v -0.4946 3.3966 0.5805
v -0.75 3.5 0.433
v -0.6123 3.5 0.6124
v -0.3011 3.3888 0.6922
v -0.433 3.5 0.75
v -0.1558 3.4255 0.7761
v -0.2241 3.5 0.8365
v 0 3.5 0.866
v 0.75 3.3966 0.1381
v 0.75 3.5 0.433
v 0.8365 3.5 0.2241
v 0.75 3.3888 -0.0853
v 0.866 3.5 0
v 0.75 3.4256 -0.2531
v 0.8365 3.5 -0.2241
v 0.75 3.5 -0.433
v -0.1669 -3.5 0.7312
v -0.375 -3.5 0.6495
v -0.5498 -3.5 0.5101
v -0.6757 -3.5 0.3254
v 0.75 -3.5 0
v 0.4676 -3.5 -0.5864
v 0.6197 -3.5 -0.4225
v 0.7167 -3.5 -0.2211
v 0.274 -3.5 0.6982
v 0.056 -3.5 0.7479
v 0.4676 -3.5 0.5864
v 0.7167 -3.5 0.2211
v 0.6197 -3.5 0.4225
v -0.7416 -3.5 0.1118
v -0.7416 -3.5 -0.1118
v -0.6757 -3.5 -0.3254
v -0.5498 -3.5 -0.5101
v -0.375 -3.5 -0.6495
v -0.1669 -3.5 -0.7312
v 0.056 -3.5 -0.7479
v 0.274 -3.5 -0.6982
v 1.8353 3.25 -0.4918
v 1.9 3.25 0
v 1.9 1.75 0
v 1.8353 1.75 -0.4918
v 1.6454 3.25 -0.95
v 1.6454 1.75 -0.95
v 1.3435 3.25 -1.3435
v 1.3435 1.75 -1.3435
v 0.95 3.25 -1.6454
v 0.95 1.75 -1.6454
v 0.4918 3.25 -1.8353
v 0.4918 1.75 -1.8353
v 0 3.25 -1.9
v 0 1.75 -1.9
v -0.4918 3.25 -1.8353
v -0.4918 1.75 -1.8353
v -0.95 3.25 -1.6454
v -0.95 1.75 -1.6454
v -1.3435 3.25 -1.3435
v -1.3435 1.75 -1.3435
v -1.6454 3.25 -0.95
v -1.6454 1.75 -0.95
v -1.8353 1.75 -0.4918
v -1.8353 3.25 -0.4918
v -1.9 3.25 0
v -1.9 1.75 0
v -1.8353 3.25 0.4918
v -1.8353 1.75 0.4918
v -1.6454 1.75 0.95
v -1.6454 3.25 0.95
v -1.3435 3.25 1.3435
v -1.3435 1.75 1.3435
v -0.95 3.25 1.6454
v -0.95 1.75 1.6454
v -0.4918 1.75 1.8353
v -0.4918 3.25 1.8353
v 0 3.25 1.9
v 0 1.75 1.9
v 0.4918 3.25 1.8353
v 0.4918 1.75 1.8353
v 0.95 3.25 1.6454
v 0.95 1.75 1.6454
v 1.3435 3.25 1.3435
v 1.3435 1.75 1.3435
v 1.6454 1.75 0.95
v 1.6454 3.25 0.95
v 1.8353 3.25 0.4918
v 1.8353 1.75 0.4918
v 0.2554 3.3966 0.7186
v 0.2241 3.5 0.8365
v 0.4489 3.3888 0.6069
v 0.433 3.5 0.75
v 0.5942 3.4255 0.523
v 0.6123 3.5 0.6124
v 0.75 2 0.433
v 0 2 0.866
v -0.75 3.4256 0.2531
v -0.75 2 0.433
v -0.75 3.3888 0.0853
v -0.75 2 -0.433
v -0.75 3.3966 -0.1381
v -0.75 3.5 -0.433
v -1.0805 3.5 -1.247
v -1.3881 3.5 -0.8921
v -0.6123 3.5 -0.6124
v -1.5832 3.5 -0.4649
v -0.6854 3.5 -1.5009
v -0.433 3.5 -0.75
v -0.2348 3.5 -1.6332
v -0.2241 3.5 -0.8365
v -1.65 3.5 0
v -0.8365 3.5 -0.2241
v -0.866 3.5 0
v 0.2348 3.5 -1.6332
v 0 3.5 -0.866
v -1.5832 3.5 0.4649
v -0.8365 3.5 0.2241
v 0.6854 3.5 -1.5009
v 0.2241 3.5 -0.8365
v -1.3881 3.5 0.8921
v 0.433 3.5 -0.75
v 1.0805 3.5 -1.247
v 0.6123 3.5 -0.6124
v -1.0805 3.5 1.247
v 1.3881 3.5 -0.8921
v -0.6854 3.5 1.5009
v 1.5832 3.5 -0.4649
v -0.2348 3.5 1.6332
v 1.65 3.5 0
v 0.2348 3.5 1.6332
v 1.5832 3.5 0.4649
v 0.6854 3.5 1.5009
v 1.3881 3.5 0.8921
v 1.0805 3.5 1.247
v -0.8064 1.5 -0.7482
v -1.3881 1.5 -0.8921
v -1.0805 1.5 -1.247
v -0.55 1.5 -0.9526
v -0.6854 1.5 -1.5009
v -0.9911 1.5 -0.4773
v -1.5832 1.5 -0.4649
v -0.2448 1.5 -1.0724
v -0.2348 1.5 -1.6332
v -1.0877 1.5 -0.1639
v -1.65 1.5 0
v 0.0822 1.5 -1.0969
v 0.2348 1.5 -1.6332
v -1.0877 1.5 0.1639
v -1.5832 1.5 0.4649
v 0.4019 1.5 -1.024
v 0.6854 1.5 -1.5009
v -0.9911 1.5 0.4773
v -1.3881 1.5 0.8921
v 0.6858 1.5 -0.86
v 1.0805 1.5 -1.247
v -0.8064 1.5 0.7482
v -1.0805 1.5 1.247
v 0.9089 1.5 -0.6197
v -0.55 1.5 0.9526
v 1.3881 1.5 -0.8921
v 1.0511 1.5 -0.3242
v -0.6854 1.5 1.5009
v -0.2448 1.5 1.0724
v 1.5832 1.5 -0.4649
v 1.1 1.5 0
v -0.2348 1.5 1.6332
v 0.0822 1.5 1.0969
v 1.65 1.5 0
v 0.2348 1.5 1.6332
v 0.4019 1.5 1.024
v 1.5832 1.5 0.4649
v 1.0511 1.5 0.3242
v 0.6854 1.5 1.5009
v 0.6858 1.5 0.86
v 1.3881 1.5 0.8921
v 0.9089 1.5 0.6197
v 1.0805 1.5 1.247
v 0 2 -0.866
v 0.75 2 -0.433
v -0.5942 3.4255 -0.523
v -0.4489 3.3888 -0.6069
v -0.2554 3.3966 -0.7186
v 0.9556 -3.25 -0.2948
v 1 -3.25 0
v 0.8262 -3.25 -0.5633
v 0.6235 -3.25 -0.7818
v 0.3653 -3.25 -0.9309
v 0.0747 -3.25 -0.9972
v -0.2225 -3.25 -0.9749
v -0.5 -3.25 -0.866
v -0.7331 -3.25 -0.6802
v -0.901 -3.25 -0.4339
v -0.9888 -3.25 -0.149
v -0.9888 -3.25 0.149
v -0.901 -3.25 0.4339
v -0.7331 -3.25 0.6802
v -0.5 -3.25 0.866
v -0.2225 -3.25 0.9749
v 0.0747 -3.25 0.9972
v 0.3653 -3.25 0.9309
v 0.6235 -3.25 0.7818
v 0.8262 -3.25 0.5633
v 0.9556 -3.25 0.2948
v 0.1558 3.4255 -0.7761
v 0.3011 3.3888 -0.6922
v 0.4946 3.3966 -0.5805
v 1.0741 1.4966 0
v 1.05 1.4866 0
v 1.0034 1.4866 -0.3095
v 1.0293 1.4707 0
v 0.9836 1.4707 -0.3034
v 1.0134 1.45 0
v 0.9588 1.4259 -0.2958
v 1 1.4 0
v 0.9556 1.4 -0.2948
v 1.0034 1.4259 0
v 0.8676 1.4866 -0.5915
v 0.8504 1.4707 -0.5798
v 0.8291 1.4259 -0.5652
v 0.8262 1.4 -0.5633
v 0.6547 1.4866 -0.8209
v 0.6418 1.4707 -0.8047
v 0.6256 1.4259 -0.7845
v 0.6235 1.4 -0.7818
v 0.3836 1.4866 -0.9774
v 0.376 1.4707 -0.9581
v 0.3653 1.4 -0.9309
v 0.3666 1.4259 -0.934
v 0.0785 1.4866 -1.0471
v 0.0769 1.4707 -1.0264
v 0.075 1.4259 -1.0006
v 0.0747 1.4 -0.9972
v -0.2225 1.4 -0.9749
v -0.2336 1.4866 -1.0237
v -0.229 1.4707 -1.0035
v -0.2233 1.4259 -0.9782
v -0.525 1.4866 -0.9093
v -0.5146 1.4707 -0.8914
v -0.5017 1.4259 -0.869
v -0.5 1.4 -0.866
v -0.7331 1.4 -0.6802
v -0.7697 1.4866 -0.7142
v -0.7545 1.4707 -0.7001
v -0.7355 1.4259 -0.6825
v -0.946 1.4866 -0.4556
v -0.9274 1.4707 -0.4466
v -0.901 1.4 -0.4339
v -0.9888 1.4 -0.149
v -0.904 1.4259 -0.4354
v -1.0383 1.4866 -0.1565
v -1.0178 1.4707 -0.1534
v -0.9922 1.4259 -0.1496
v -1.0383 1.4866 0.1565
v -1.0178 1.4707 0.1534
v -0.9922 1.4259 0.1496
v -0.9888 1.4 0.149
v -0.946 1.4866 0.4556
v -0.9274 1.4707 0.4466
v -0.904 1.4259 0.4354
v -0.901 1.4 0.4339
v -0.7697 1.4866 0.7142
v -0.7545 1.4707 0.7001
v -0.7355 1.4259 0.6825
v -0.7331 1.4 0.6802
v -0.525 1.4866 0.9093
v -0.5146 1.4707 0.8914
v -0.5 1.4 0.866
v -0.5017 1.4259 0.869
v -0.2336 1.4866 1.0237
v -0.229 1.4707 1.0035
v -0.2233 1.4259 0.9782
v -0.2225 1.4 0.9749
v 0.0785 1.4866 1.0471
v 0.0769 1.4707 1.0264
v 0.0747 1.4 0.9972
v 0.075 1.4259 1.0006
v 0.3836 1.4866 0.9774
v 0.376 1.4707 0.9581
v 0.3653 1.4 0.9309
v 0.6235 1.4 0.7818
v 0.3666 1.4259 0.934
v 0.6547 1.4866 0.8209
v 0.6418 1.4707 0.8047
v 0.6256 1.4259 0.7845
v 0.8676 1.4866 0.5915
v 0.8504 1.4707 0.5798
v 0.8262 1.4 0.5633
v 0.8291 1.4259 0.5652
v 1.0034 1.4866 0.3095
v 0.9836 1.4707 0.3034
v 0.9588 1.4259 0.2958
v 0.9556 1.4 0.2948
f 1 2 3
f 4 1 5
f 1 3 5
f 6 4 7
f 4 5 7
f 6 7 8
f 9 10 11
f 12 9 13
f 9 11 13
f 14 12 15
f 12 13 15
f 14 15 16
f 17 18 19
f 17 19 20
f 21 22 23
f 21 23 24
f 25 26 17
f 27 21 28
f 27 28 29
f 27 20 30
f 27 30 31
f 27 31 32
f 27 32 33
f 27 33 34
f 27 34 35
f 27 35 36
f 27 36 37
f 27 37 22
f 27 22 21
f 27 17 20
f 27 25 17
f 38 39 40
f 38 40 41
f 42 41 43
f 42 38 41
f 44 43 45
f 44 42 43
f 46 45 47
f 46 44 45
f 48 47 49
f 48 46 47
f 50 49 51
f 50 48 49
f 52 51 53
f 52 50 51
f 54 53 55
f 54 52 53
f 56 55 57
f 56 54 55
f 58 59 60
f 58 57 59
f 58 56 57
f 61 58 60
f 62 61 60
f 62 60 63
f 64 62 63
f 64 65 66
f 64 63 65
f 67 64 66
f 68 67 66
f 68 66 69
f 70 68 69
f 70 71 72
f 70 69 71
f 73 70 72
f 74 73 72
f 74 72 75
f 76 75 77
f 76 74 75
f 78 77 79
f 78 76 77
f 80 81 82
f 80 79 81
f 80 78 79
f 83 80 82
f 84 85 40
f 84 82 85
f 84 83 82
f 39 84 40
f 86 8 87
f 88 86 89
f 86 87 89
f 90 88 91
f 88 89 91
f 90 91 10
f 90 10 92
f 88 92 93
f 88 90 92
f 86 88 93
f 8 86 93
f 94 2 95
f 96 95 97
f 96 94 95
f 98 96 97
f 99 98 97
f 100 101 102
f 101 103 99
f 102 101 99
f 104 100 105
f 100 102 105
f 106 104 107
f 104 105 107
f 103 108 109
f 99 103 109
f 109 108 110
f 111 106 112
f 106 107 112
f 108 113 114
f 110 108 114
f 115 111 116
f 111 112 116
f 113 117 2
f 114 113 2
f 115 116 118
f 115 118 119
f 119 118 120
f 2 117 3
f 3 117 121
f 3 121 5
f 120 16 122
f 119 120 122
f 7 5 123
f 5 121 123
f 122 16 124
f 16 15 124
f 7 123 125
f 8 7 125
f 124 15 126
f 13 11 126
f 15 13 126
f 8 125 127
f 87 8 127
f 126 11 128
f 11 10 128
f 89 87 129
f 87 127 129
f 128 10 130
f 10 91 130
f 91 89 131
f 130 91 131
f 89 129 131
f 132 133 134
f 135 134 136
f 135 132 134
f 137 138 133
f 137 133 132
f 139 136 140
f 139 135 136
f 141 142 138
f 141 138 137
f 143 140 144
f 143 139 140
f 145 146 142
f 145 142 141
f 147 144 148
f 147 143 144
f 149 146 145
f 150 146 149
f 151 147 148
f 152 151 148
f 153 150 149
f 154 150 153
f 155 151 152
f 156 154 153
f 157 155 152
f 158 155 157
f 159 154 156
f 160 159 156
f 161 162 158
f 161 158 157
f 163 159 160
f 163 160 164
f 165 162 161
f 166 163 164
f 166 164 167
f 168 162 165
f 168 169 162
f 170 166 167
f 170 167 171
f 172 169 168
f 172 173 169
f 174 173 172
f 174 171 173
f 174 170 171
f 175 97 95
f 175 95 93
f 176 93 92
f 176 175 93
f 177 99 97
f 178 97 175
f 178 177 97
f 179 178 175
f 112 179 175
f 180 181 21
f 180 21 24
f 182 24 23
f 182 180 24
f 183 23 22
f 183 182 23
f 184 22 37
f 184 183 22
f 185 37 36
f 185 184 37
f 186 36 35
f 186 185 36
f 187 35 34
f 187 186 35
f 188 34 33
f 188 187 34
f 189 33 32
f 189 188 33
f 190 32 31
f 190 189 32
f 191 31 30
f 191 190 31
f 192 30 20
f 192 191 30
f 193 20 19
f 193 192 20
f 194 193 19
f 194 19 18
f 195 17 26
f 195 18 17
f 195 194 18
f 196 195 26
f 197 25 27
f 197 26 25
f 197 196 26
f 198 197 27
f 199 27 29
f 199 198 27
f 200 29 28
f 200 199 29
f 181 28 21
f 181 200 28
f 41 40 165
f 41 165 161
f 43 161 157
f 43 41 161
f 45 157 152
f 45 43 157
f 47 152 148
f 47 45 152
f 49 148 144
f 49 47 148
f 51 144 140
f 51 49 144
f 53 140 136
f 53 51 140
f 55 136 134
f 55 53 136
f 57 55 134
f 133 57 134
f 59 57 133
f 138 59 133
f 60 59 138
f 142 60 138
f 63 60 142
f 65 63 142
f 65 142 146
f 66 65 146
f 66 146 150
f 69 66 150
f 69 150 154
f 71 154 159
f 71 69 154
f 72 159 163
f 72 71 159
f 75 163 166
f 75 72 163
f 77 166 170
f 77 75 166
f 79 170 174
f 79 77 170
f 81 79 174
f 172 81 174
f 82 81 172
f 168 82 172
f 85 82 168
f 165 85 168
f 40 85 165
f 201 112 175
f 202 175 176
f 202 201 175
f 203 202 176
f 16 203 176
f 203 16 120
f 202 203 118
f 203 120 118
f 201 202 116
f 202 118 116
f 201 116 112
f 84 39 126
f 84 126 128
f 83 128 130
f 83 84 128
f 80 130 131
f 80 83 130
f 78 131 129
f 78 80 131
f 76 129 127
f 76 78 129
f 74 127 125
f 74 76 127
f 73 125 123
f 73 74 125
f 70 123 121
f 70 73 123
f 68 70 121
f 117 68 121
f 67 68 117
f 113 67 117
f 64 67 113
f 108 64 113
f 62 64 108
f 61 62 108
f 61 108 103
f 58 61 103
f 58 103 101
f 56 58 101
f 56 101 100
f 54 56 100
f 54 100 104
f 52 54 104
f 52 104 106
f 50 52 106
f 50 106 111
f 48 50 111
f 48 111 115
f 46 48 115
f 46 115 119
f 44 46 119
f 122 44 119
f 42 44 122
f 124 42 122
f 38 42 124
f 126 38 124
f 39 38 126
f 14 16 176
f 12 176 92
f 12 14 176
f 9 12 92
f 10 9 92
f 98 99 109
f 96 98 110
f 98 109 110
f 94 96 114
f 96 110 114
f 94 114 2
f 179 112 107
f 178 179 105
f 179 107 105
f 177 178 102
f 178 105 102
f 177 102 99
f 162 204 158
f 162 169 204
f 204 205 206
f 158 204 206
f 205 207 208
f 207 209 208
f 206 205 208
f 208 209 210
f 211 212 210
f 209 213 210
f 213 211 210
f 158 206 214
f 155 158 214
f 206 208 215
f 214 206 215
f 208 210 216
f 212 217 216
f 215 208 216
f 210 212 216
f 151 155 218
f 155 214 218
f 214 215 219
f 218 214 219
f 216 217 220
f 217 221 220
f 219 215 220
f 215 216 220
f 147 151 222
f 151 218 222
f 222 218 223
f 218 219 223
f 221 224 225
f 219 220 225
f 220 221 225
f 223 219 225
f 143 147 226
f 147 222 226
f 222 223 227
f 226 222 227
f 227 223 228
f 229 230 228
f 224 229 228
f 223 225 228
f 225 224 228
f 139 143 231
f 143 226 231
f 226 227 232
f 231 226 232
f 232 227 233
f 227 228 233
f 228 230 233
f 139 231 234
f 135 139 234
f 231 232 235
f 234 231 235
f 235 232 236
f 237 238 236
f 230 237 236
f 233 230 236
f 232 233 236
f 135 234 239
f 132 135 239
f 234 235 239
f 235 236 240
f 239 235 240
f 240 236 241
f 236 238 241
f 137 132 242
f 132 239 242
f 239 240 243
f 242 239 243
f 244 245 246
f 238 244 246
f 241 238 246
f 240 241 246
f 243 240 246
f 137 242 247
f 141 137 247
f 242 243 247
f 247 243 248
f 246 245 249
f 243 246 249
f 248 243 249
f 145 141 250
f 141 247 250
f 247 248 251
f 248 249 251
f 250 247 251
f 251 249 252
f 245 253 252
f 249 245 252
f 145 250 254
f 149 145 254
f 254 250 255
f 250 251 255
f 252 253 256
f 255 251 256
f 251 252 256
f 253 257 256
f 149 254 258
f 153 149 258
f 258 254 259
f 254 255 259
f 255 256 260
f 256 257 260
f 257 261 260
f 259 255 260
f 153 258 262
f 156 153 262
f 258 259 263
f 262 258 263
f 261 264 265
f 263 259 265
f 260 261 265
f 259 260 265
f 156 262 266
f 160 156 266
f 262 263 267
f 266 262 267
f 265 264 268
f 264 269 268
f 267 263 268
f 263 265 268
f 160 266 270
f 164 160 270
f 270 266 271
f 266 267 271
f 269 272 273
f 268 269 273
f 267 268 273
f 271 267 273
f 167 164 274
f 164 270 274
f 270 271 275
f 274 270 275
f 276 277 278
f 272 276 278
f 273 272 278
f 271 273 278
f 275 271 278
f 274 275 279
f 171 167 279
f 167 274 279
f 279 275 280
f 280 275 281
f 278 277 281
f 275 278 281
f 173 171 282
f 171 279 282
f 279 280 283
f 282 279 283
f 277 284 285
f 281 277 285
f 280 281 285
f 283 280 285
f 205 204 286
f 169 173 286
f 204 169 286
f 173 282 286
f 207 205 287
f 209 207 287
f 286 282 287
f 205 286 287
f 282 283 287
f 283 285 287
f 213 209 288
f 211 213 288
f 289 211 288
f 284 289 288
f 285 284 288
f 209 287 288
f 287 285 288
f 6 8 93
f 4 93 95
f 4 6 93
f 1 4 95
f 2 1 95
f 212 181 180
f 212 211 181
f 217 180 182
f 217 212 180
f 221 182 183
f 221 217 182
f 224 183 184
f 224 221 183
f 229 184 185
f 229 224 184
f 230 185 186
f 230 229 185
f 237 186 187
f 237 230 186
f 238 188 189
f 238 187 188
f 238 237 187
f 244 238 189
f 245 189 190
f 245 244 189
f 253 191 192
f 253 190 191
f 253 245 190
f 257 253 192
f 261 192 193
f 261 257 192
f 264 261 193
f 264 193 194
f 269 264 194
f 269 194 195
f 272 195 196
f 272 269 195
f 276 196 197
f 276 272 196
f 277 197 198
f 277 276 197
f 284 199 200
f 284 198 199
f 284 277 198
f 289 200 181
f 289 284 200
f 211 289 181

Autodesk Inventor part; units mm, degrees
ref_plane "YZ Plane" through (0, 0, 0) normal (1, 0, 0) x (0, 1, 0)
ref_plane "XZ Plane" through (0, 0, 0) normal (0, 1, 0) x (-1, 0, 0)
ref_plane "XY Plane" through (0, 0, 0) normal (0, 0, 1) x (1, 0, 0)
sketch "Sketch1" plane through (0, 0, 0) normal (0, 0, 1) x (1, 0, 0)
  line L0 (0, 3.5) -> (0, -3.5)
  line L1 (0, -3.5) -> (0.75, -3.5)
  line L2 (0.75, -3.5) -> (1, -3.25)
  line L3 (1, -3.25) -> (1, 1.4)
  line L4 (1.1, 1.5) -> (1.65, 1.5)
  line L5 (1.9, 1.75) -> (1.9, 3.25)
  line L6 (1.65, 3.5) -> (0, 3.5)
  arc A0 (1.1, 1.5) -> (1, 1.4) centre (1.1, 1.4) ccw
  line L7 (1.65, 3.5) -> (1.9, 3.25)
  line L8 (1.65, 1.5) -> (1.9, 1.75)
  point P0 (0, 0)
  point P1 (1.9, 1.5)
  point P2 (1.9, 3.5)
  point P3 (0, 0)
  dimension "d0" = 3.8
  dimension "d1" = 2
  dimension "d3" = 2
  dimension "d4" = 2.2
  dimension "d5" = 135
  dimension "d6" = 0.25
  dimension "d7" = 5
  dimension "d18" = 0.25
revolve "Revolution1" add sketch "Sketch1" angle 360 about axis through (0, 3.5, 0) along (0, -1, 0)
sketch "Sketch2" plane through (0, 3.5, 0) normal (0, 1, 0) x (1, 0, 0)
  line L0 (0, -0.866) -> (-0.75, -0.433)
  line L1 (-0.75, -0.433) -> (-0.75, 0.433)
  line L2 (-0.75, 0.433) -> (0, 0.866)
  line L3 (0, 0.866) -> (0.75, 0.433)
  line L4 (0.75, 0.433) -> (0.75, -0.433)
  line L5 (0.75, -0.433) -> (0, -0.866)
  point P0 (0, 0)
  point P1 (0, 0)
  dimension "d11" = 1.5
extrude "Extrusion1" cut sketch "Sketch2" against normal blind 1.5
thread "Thread1" size "M2x0.4" class "6g" standard "ANSI Metric M Profile" full length
sketch "Sketch3" plane through (0, 0, 0) normal (1, 0, 0) x (0, 1, 0)
  line L0 (3.5, 0.866) -> (3.5, 0.433) projected
  line L1 (3.5, 0.866) -> (3, 0.366)
  line L2 (3, 0.366) -> (3.5, 0.366)
  line L3 (3.5, 0.366) -> (3.5, 0.866)
  line L4 (-0.6, 0) -> (3.6, 0) projected
  point P0 (0, 0)
  dimension "d16" = 0.5
revolve "Revolution2" cut sketch "Sketch3" angle 360 about axis through (0, -10, 0) along (0, 1, 0)
properties part number "Bolt_M2x0.4_5mm_SH" material "Stainless Steel"
